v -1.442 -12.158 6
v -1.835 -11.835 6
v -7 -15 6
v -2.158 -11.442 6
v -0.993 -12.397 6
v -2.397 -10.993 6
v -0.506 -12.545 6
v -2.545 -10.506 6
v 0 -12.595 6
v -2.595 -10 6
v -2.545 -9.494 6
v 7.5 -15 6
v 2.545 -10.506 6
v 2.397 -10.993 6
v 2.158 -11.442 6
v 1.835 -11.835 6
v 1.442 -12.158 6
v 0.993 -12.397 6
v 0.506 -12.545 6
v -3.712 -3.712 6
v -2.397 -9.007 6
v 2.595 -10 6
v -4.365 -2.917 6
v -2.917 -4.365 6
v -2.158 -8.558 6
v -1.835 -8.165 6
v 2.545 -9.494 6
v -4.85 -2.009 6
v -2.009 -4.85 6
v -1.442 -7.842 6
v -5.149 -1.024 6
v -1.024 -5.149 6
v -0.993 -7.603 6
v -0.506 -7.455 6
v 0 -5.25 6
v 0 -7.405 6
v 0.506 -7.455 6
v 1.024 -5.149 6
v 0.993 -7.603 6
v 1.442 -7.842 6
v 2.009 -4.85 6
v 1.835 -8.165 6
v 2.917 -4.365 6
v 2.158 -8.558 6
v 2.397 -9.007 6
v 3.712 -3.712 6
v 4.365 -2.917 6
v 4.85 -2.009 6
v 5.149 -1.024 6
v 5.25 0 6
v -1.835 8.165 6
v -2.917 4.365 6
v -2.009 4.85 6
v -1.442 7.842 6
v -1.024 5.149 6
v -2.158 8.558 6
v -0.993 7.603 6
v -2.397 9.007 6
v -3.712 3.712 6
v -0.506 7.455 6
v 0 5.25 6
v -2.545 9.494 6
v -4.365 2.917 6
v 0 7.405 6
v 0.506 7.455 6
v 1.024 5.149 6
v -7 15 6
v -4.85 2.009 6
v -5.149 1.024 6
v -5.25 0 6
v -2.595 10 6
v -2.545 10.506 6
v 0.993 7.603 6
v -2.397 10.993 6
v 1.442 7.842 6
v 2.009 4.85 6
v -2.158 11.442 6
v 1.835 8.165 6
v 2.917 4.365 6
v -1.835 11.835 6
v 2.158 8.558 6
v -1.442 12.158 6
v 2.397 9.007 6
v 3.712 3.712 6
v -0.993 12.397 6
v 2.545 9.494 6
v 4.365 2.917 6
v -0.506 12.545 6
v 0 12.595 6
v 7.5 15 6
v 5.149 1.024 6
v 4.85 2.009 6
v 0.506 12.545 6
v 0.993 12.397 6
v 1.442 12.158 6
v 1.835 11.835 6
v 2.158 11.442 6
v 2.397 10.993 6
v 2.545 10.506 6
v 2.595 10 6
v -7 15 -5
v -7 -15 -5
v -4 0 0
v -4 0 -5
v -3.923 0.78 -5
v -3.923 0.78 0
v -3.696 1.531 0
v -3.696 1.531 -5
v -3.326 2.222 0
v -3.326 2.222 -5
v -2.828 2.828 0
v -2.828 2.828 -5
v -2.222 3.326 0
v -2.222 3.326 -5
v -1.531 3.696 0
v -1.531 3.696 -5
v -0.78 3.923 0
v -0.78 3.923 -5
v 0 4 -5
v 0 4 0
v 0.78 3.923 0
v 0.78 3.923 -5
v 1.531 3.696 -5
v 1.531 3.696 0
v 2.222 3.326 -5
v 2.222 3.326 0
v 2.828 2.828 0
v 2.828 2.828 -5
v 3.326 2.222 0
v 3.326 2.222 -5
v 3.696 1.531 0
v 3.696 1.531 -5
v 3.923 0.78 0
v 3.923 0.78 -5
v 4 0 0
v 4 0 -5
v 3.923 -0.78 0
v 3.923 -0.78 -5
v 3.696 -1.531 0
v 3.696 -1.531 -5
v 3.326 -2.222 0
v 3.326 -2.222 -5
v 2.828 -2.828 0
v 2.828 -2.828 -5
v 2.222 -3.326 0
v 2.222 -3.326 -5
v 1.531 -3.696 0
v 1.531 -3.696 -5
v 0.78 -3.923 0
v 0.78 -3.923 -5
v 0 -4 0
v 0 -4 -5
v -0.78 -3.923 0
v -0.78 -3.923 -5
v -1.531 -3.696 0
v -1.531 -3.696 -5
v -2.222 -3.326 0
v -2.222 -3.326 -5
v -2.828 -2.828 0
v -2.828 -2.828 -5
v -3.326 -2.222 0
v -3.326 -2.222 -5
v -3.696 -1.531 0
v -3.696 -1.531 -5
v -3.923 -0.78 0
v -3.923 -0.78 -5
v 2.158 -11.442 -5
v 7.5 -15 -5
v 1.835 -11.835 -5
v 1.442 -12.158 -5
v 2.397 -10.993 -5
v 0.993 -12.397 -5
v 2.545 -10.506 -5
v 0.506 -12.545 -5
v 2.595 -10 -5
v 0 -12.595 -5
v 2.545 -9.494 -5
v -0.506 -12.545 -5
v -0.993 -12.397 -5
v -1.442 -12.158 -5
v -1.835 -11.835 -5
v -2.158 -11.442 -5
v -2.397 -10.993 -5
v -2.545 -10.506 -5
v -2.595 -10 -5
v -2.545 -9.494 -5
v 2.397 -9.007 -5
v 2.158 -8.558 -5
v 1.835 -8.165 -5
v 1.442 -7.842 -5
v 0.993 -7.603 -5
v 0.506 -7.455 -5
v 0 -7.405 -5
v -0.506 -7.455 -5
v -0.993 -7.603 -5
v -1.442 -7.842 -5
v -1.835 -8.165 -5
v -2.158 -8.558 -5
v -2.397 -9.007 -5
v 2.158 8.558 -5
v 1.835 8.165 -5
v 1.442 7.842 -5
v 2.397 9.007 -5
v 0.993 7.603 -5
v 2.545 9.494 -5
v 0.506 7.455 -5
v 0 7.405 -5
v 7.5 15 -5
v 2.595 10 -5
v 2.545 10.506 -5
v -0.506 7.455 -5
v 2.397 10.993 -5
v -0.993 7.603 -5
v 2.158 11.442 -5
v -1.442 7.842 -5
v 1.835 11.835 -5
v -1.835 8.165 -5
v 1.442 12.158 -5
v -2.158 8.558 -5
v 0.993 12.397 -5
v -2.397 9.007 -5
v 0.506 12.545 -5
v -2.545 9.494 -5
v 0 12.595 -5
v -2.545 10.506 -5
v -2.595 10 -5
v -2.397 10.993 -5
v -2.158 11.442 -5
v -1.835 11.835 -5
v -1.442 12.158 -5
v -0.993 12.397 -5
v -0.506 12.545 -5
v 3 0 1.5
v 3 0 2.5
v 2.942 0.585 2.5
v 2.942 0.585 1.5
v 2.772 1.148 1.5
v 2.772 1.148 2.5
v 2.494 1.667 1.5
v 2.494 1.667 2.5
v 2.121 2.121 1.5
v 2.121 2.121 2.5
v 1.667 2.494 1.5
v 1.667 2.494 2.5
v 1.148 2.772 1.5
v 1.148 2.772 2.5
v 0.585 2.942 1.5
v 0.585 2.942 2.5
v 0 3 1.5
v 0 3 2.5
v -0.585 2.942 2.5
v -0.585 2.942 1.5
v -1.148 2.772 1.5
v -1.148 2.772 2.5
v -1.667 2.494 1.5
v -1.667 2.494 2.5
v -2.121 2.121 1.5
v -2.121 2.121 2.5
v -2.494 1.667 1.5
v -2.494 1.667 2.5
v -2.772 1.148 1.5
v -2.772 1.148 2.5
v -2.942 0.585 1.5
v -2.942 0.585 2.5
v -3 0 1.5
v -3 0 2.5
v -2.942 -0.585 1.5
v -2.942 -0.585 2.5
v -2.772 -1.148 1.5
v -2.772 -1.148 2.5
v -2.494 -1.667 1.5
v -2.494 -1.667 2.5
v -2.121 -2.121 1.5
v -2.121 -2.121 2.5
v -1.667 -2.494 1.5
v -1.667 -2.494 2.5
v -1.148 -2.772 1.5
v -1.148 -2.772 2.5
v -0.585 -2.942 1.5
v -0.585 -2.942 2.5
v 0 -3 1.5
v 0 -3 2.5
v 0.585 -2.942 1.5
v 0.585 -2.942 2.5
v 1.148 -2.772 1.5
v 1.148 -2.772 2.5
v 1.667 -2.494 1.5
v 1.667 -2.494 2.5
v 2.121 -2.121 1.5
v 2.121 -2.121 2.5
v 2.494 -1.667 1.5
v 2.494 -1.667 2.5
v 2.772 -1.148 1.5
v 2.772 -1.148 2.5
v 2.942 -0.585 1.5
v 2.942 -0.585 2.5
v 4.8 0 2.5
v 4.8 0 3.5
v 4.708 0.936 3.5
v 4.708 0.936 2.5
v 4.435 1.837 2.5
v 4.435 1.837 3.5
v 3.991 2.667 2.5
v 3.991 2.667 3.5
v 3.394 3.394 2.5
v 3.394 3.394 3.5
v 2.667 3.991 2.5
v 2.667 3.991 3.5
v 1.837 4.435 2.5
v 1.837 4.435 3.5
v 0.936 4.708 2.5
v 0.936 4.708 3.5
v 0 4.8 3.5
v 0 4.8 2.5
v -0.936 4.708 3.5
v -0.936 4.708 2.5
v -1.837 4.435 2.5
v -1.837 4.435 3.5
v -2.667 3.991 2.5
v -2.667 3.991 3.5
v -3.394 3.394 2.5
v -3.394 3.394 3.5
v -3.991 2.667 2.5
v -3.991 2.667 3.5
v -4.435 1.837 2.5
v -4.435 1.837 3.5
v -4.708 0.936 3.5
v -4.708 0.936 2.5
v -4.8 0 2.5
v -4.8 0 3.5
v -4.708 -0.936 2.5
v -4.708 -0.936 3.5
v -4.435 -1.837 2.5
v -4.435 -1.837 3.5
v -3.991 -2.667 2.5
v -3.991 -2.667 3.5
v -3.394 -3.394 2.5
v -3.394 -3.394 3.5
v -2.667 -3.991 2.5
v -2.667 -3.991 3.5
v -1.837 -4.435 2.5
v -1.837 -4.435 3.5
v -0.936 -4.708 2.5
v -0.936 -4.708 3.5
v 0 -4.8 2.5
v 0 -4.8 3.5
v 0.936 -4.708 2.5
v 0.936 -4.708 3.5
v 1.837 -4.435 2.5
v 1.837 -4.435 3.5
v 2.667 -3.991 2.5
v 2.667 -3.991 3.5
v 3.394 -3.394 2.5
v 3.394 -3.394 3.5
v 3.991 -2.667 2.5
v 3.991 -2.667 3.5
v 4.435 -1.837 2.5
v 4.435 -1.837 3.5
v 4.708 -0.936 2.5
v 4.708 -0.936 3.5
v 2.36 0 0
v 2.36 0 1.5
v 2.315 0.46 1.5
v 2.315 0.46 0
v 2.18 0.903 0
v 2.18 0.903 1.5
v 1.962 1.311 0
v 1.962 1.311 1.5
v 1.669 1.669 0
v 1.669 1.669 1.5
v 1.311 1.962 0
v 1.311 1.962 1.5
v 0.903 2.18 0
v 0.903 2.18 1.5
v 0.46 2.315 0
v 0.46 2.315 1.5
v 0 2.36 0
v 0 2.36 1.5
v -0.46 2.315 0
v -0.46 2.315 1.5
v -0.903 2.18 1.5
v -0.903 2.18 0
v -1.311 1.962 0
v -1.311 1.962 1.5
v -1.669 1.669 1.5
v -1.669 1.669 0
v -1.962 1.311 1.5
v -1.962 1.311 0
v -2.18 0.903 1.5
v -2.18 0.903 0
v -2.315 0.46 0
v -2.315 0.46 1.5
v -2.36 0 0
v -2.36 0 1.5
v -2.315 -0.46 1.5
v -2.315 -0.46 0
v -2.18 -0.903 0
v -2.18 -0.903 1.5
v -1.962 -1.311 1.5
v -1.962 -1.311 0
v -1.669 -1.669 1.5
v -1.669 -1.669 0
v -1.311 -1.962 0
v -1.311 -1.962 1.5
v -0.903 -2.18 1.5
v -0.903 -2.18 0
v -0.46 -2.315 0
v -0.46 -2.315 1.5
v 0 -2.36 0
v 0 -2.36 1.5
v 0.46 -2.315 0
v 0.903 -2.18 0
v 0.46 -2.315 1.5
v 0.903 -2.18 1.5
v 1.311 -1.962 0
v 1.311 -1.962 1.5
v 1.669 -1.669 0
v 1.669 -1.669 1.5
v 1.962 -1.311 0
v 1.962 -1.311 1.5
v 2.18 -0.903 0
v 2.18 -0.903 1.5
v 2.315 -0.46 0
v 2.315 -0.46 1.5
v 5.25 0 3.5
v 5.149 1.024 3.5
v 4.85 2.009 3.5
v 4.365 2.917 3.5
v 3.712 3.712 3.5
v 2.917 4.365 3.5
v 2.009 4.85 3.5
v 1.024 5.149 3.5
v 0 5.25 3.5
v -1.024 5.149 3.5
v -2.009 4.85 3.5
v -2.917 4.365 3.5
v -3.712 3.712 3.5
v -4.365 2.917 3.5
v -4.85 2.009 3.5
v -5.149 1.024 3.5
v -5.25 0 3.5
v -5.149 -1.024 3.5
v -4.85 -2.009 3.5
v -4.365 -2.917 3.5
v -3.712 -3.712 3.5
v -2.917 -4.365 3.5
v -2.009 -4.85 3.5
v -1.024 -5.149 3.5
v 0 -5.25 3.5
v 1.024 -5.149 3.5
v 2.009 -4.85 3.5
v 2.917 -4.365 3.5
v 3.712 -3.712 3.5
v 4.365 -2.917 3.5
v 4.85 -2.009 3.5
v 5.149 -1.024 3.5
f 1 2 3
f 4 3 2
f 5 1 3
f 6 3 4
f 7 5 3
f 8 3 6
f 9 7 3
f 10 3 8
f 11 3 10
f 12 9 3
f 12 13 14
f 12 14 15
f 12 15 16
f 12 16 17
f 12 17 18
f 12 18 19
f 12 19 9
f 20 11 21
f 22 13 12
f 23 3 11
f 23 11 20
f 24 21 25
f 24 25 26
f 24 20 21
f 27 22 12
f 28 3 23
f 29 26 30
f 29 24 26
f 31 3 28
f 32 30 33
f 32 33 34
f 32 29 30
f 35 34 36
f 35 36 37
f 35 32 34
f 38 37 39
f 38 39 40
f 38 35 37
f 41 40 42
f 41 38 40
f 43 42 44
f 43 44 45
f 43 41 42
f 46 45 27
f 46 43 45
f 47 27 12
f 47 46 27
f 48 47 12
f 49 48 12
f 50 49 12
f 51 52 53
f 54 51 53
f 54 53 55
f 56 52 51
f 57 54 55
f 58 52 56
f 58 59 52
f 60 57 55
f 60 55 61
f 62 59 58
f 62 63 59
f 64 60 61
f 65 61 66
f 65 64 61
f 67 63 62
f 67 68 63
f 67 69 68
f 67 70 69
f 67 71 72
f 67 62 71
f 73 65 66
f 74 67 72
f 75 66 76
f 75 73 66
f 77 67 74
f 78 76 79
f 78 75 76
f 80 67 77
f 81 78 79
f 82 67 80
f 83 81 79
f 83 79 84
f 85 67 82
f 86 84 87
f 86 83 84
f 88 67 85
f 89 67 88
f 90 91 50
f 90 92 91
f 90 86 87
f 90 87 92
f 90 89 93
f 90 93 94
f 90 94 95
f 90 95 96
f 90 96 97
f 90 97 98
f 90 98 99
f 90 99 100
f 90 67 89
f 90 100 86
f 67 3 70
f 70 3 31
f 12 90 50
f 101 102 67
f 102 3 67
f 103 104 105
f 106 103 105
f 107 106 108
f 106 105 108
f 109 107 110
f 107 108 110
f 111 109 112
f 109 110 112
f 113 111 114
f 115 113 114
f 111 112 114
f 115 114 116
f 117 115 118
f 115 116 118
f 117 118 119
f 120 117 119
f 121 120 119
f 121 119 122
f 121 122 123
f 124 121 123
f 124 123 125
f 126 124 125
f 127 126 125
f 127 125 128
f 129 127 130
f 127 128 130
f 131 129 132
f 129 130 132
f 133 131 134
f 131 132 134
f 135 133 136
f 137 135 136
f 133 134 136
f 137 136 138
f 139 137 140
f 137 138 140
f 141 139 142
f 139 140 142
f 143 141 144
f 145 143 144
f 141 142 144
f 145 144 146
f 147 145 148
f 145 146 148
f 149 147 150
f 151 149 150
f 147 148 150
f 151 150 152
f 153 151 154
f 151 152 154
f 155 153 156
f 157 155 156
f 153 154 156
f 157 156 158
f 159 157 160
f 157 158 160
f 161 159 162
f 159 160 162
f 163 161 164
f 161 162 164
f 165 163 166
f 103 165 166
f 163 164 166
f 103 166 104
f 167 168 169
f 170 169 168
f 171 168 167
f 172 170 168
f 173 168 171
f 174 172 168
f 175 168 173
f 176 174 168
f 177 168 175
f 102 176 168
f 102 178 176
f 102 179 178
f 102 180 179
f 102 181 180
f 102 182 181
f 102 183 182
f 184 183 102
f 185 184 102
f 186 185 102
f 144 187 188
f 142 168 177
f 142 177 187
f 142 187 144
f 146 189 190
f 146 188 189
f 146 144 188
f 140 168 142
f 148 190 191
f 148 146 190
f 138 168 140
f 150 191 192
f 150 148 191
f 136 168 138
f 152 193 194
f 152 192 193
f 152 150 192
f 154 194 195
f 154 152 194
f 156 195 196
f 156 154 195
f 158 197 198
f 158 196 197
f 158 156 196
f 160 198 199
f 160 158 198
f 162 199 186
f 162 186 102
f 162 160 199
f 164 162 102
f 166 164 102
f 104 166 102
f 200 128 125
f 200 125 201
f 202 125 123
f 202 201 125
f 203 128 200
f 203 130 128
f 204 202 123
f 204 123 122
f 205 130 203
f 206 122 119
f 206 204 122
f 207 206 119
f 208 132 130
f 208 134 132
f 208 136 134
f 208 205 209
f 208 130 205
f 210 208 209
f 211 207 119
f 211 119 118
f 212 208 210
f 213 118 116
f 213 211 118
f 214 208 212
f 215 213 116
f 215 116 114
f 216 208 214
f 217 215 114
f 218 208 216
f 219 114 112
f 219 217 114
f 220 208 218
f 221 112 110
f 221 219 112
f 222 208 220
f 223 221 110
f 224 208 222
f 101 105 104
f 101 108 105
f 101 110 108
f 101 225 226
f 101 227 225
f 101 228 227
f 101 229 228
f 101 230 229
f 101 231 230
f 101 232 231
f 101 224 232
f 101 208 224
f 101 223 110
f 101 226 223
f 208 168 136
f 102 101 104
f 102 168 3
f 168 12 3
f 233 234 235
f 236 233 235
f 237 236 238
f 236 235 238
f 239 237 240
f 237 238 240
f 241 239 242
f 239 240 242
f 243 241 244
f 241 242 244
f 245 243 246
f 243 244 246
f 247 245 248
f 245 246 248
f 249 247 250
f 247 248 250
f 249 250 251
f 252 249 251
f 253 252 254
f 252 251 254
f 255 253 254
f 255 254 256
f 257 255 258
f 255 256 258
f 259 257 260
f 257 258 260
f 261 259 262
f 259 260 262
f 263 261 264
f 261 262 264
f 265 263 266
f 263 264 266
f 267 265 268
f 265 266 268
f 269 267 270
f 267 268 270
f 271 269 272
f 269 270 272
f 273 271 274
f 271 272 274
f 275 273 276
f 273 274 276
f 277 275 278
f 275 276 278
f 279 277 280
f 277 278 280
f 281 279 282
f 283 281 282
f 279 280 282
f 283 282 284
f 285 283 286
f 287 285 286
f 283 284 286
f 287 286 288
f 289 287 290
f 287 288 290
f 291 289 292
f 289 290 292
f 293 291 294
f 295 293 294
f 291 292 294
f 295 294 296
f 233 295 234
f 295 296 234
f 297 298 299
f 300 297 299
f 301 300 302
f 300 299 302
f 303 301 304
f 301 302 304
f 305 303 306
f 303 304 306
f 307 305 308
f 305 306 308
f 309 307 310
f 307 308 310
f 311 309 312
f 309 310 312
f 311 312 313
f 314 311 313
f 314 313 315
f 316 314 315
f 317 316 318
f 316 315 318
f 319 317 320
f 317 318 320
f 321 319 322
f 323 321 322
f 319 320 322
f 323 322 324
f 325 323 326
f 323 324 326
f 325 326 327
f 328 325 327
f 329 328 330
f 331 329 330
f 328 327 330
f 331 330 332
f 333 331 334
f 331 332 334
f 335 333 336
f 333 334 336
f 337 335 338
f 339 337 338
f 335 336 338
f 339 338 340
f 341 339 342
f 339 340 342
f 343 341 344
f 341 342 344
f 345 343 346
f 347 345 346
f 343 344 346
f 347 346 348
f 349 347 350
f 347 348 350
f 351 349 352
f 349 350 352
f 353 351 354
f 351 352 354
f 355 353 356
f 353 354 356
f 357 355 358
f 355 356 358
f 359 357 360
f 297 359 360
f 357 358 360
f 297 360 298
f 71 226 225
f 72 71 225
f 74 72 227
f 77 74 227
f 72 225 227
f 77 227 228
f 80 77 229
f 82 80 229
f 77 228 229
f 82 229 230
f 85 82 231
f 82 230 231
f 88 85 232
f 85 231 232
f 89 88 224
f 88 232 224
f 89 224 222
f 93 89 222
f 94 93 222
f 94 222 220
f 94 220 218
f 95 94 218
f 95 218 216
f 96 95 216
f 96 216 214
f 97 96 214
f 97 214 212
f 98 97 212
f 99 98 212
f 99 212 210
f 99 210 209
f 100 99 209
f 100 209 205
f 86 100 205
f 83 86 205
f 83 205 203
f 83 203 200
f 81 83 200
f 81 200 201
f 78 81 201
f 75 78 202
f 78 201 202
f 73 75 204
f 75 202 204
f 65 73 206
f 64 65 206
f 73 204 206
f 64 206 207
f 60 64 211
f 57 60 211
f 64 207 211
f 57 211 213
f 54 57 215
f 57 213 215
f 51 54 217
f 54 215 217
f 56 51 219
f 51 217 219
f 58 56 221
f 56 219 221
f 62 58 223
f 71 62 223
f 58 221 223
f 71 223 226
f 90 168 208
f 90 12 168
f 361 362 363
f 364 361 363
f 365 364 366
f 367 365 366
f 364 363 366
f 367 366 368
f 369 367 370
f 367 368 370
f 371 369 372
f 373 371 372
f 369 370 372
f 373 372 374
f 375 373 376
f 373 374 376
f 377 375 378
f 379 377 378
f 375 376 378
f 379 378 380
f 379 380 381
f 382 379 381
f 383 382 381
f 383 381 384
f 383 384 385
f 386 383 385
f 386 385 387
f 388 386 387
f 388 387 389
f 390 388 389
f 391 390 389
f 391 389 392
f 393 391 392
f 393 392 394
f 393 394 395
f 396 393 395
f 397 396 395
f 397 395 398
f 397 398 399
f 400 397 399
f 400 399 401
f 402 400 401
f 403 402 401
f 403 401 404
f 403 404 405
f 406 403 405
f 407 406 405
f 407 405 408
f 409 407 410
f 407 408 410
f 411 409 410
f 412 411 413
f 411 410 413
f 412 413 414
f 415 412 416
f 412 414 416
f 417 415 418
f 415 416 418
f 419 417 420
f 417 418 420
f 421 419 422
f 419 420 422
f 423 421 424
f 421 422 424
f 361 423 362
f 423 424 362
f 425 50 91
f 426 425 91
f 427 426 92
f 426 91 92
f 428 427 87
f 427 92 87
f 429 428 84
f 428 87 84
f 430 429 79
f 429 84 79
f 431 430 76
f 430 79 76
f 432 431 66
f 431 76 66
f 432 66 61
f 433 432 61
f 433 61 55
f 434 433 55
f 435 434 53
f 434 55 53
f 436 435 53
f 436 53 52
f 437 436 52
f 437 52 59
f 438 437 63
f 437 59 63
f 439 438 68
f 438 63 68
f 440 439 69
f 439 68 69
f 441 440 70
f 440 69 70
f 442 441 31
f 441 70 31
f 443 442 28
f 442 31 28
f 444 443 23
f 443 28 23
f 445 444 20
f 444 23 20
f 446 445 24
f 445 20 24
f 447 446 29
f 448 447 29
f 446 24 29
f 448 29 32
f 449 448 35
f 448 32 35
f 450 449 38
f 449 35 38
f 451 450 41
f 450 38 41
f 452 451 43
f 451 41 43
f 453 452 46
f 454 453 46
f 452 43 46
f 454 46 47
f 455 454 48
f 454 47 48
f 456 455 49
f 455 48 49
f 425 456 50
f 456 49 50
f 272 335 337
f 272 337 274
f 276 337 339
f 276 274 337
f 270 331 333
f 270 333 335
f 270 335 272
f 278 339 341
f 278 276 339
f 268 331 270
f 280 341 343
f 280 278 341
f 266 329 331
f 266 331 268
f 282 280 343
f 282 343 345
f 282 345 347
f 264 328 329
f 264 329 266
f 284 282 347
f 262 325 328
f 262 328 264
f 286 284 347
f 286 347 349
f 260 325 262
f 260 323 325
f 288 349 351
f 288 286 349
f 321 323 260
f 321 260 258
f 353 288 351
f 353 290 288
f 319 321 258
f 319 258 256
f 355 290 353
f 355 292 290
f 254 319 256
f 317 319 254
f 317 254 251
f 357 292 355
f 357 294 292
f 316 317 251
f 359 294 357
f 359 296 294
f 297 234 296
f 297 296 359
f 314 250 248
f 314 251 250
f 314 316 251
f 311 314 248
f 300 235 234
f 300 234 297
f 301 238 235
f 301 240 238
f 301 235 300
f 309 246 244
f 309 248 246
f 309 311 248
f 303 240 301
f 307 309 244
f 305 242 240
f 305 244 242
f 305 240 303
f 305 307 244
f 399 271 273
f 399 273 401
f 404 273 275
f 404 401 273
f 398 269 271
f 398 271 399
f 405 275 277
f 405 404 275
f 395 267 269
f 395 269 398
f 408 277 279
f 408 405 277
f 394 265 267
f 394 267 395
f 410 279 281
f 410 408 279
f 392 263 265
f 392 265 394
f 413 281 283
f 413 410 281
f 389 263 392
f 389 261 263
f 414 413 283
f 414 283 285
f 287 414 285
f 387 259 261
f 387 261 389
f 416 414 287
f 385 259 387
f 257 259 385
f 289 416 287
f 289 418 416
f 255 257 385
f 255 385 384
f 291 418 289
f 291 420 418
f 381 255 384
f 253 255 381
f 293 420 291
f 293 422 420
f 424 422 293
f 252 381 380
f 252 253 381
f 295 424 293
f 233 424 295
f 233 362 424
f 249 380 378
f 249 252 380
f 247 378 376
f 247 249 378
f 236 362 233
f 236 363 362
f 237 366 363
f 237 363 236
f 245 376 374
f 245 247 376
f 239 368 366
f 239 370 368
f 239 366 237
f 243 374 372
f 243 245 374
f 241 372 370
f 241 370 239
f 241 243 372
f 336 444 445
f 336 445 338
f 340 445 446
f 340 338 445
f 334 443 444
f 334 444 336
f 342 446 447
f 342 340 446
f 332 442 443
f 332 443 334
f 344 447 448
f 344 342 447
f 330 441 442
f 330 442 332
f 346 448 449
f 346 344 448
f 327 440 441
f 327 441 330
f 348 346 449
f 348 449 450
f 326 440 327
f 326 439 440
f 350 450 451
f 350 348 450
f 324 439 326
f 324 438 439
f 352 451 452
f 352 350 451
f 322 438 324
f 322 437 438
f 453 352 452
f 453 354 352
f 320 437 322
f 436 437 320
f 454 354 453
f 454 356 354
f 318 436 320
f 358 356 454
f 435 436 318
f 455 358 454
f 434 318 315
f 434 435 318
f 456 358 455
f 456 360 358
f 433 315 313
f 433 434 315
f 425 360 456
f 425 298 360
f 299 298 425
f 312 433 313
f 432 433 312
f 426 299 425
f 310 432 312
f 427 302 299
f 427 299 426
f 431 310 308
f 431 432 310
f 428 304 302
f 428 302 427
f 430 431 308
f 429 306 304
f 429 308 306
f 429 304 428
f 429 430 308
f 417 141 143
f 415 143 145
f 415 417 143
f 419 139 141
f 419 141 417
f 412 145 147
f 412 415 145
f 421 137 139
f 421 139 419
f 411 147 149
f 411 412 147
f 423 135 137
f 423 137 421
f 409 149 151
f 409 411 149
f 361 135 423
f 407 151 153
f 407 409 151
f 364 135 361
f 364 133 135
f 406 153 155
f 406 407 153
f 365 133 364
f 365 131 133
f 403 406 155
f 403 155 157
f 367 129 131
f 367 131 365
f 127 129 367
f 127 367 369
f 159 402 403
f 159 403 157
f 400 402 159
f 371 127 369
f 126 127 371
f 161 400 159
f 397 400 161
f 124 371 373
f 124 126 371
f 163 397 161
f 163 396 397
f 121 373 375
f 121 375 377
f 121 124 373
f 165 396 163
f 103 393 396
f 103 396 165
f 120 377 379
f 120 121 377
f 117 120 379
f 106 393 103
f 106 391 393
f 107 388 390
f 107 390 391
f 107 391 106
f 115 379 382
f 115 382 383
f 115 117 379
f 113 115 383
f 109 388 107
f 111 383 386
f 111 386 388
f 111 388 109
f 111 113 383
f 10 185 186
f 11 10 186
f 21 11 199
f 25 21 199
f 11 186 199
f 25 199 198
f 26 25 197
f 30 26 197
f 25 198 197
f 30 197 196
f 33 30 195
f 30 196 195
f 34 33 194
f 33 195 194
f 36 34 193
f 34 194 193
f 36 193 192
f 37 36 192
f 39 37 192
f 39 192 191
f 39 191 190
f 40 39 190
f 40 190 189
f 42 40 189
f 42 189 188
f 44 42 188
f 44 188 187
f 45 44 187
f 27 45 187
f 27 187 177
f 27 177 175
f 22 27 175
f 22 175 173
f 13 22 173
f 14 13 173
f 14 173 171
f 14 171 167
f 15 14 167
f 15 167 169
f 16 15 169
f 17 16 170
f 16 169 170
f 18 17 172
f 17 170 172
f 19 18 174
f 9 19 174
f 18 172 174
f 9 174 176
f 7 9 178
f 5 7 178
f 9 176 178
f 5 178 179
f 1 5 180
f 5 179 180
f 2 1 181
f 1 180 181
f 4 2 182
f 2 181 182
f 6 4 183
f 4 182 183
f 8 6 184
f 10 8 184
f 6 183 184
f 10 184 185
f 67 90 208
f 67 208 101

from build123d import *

# Parameters (mm, degrees)
SKETCH1_W               = 15
SKETCH1_H               = 30
BOSS_EXTRUDE1_DEPTH     = 6
SKETCH2_R               = 5.25
CUT_EXTRUDE1_DEPTH      = 2.5
SKETCH4_R               = 4.8
CUT_EXTRUDE3_DEPTH      = 1
SKETCH5_R               = 2.36
CUT_EXTRUDE4_DEPTH      = 4.5
CUT_EXTRUDE4_DEPTH_BACK = 5
CUT_EXTRUDE6_DEPTH      = 7
CUT_EXTRUDE6_DEPTH_BACK = 1
SKETCH11_W              = 14.5
SKETCH11_H              = 30
BOSS_EXTRUDE5_DEPTH     = 5
SKETCH12_R              = 4
CUT_EXTRUDE8_DEPTH      = 5
SKETCH13_R              = 2.595
CUT_EXTRUDE9_DEPTH      = 12
SKETCH14_R              = 3
CUT_EXTRUDE10_DEPTH     = 1


with BuildPart() as part:
    # Sketch1 → Boss-Extrude1 (new body)
    with BuildSketch(Plane.XY):
        Rectangle(SKETCH1_W, SKETCH1_H)
    extrude(amount=BOSS_EXTRUDE1_DEPTH)

    # Sketch2 → Cut-Extrude1 (cut)
    with BuildSketch(Plane.XY.offset(6)):
        Circle(SKETCH2_R)
    extrude(amount=-CUT_EXTRUDE1_DEPTH, mode=Mode.SUBTRACT)

    # Sketch4 → Cut-Extrude3 (cut)
    with BuildSketch(Plane.XY.offset(3.5)):
        Circle(SKETCH4_R)
    extrude(amount=-CUT_EXTRUDE3_DEPTH, mode=Mode.SUBTRACT)

    # Sketch5 → Cut-Extrude4 (cut, two sides)
    with BuildSketch(Plane.XY.offset(2.5)) as cut_extrude4_sk:
        Circle(SKETCH5_R)
    extrude(amount=CUT_EXTRUDE4_DEPTH, mode=Mode.SUBTRACT)
    extrude(cut_extrude4_sk.sketch, amount=-CUT_EXTRUDE4_DEPTH_BACK, mode=Mode.SUBTRACT)

    # Sketch6 → Cut-Extrude6 (cut, two sides)
    with BuildSketch(Plane.XY) as cut_extrude6_sk:
        Polygon((-7, 91.640828326), (-7, 15), (-7, -15), (-7, -91.640828326), (-160.281656652, -91.640828326), (-160.281656652, 91.640828326), align=None)
    extrude(amount=CUT_EXTRUDE6_DEPTH, mode=Mode.SUBTRACT)
    extrude(cut_extrude6_sk.sketch, amount=-CUT_EXTRUDE6_DEPTH_BACK, mode=Mode.SUBTRACT)

    # Sketch11 → Boss-Extrude5 (add)
    with BuildSketch(Plane(origin=(0, 0, 0), x_dir=(-1, 0, 0), z_dir=(0, 0, -1))):
        with Locations((-0.25, 0)):
            Rectangle(SKETCH11_W, SKETCH11_H)
    extrude(amount=BOSS_EXTRUDE5_DEPTH)

    # Sketch12 → Cut-Extrude8 (cut)
    with BuildSketch(Plane(origin=(0, 0, -5), x_dir=(-1, 0, 0), z_dir=(0, 0, -1))):
        Circle(SKETCH12_R)
    extrude(amount=-CUT_EXTRUDE8_DEPTH, mode=Mode.SUBTRACT)

    # Sketch13 → Cut-Extrude9 (cut, through all)
    with BuildSketch(Plane(origin=(0, 0, -5), x_dir=(-1, 0, 0), z_dir=(0, 0, -1))):
        with Locations((0, -10)):
            Circle(SKETCH13_R)
        with Locations((0, 10)):
            Circle(SKETCH13_R)
    extrude(amount=-CUT_EXTRUDE9_DEPTH, mode=Mode.SUBTRACT)

    # Sketch14 → Cut-Extrude10 (cut)
    with BuildSketch(Plane.XY.offset(2.5)):
        Circle(SKETCH14_R)
    extrude(amount=-CUT_EXTRUDE10_DEPTH, mode=Mode.SUBTRACT)


solid = part.part
